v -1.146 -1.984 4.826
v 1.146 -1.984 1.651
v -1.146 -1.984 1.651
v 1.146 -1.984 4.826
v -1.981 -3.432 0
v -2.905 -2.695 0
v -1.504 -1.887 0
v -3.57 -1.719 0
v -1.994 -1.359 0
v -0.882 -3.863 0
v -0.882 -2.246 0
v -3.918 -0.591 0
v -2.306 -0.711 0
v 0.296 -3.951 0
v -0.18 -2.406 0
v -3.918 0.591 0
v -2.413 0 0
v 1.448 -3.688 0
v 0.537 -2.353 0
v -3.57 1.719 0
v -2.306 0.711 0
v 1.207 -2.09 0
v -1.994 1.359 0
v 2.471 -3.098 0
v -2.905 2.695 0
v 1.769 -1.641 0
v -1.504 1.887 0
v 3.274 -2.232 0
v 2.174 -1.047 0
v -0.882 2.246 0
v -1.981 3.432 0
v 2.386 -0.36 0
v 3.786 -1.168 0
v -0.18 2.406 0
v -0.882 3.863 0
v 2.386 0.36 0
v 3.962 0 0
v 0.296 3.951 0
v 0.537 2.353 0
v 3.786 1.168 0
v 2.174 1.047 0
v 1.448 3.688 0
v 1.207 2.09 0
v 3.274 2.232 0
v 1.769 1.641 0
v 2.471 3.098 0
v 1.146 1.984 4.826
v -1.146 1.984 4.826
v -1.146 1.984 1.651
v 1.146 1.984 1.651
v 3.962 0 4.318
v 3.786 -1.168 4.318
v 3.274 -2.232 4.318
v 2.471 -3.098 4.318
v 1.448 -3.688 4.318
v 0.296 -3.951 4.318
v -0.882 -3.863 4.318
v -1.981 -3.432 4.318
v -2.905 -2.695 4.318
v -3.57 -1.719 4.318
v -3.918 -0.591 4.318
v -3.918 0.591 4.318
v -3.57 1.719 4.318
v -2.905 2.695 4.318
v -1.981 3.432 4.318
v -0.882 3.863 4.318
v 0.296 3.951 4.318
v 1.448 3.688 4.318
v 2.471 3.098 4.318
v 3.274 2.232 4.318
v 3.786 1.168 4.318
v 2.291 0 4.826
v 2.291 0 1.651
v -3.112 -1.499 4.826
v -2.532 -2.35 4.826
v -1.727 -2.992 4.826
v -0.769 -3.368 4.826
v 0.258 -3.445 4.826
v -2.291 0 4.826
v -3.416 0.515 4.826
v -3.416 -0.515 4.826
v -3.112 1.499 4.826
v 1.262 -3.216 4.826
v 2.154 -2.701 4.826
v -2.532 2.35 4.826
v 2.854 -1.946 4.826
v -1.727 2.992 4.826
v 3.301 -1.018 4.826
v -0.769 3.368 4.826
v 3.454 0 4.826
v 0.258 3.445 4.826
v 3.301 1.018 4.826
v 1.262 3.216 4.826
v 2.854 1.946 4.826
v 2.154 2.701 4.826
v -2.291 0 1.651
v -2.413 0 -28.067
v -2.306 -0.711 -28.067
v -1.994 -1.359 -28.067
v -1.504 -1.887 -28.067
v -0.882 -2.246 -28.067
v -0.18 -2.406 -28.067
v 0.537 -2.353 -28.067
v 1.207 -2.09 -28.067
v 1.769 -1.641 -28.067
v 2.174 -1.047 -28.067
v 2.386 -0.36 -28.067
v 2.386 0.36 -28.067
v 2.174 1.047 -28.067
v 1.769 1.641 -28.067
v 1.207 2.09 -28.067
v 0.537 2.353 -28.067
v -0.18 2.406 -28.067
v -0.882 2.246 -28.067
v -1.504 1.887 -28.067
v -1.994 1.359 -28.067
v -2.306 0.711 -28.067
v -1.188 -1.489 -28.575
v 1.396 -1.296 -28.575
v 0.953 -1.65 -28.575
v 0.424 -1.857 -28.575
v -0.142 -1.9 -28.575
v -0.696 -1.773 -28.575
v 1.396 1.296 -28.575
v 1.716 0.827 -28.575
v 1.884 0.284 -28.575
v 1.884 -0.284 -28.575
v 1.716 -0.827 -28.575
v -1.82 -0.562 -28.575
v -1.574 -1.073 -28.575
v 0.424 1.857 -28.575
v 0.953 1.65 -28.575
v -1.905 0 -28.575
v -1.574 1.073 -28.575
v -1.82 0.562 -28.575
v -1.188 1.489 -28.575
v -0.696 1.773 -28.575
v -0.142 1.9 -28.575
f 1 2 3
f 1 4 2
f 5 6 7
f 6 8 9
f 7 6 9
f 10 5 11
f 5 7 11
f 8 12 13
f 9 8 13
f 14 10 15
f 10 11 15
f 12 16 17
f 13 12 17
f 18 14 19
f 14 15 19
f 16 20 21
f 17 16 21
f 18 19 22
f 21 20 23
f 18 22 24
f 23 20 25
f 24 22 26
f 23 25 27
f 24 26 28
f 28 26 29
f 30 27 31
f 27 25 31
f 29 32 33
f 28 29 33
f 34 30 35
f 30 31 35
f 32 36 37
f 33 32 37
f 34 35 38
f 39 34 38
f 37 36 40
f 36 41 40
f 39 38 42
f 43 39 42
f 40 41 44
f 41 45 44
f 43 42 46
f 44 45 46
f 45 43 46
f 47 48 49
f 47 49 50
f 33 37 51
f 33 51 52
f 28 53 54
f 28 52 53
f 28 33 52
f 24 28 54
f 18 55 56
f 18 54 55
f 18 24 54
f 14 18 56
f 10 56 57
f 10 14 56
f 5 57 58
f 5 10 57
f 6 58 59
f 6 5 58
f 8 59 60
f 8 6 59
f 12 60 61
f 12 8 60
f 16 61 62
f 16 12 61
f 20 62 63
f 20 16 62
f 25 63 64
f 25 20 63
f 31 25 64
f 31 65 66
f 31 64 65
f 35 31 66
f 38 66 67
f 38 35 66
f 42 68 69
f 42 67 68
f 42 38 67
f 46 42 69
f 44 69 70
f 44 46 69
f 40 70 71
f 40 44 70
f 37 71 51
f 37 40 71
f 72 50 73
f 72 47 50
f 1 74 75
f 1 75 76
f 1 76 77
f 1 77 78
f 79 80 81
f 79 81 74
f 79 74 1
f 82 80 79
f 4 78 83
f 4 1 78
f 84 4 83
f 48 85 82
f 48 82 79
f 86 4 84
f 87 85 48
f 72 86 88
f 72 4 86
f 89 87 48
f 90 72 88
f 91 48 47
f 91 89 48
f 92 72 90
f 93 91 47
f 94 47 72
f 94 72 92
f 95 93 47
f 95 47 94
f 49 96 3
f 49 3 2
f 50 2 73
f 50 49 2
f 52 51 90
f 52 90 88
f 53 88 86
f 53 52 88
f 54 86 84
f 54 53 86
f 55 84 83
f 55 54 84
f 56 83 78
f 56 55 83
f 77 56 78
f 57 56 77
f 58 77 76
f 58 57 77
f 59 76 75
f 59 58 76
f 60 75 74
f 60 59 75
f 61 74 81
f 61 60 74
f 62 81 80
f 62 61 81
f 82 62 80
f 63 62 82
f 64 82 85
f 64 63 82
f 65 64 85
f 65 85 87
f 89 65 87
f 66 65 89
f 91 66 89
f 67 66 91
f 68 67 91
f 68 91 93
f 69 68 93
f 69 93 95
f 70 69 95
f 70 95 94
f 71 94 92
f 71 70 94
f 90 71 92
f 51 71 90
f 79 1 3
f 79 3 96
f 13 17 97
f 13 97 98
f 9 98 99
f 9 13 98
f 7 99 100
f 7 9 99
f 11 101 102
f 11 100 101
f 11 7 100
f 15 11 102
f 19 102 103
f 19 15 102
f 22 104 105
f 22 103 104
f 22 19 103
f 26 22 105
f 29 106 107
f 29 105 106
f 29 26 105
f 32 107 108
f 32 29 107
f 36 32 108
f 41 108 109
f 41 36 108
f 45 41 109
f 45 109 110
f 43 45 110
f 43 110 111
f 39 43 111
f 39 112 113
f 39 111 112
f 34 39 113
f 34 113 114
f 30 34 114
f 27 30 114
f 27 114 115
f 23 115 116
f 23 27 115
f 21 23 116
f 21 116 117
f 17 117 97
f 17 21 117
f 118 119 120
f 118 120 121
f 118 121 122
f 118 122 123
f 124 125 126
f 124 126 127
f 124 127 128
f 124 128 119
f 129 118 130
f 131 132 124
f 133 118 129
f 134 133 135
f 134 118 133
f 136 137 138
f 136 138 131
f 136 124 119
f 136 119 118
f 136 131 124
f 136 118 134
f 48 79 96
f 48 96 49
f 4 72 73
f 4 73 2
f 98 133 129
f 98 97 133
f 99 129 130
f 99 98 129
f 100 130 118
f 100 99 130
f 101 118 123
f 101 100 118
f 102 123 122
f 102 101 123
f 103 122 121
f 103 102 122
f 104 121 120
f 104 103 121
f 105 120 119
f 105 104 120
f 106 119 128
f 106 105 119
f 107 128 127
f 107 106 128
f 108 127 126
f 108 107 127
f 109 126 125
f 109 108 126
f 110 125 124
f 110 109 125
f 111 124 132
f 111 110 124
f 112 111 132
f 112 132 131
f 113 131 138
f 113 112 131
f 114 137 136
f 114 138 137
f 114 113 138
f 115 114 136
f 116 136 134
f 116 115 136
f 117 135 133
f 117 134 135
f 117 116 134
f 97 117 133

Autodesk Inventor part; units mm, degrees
ref_plane "YZ Plane" through (0, 0, 0) normal (1, 0, 0) x (0, 1, 0)
ref_plane "XZ Plane" through (0, 0, 0) normal (0, 1, 0) x (-1, 0, 0)
ref_plane "XY Plane" through (0, 0, 0) normal (0, 0, 1) x (1, 0, 0)
sketch "Sketch1" plane through (0, 0, 0) normal (0, 0, 1) x (1, 0, 0)
  circle A0 centre (0, 0) radius 3.9624
  dimension "d0" = 7.9248
extrude "Extrusion1" add sketch "Sketch1" along normal blind 4.826
sketch "Sketch2" plane through (0, 0, 0) normal (0, 0, -1) x (-1, 0, 0)
  circle A0 centre (0, 0) radius 3.9624 projected
  circle A1 centre (0, 0) radius 2.413
  dimension "d3" = 4.826
extrude "Extrusion2" add sketch "Sketch2" along normal blind 28.575 contours A1
sketch "Sketch3" plane through (0, 0, 4.826) normal (0, 0, 1) x (1, 0, 0)
  circle A0 centre (0, 0) radius 3.9624 projected
  line L0 (-1.1457, 1.9844) -> (1.1457, 1.9844)
  line L1 (1.1457, 1.9844) -> (2.2914, 0)
  line L2 (2.2914, 0) -> (1.1457, -1.9844)
  line L3 (1.1457, -1.9844) -> (-1.1457, -1.9844)
  line L4 (-1.1457, -1.9844) -> (-2.2914, 0)
  line L5 (-2.2914, 0) -> (-1.1457, 1.9844)
  dimension "d6" = 3.9688
extrude "Extrusion3" cut sketch "Sketch3" against normal blind 3.175 contours L0 L1 L2 L3 L4 L5
thread "Thread1" size "10-32 UNF" class "2A" standard "ANSI Unified Screw Threads" length 25.4
chamfer "Chamfer1" distance 0.508 angle 45 1 edges at (2.413, 0, -28.575)
chamfer "Chamfer2" distance 0.508 angle 45 1 edges at (-3.9624, 0, 4.826)
properties part number "10-32 x1000" material "Steel"
